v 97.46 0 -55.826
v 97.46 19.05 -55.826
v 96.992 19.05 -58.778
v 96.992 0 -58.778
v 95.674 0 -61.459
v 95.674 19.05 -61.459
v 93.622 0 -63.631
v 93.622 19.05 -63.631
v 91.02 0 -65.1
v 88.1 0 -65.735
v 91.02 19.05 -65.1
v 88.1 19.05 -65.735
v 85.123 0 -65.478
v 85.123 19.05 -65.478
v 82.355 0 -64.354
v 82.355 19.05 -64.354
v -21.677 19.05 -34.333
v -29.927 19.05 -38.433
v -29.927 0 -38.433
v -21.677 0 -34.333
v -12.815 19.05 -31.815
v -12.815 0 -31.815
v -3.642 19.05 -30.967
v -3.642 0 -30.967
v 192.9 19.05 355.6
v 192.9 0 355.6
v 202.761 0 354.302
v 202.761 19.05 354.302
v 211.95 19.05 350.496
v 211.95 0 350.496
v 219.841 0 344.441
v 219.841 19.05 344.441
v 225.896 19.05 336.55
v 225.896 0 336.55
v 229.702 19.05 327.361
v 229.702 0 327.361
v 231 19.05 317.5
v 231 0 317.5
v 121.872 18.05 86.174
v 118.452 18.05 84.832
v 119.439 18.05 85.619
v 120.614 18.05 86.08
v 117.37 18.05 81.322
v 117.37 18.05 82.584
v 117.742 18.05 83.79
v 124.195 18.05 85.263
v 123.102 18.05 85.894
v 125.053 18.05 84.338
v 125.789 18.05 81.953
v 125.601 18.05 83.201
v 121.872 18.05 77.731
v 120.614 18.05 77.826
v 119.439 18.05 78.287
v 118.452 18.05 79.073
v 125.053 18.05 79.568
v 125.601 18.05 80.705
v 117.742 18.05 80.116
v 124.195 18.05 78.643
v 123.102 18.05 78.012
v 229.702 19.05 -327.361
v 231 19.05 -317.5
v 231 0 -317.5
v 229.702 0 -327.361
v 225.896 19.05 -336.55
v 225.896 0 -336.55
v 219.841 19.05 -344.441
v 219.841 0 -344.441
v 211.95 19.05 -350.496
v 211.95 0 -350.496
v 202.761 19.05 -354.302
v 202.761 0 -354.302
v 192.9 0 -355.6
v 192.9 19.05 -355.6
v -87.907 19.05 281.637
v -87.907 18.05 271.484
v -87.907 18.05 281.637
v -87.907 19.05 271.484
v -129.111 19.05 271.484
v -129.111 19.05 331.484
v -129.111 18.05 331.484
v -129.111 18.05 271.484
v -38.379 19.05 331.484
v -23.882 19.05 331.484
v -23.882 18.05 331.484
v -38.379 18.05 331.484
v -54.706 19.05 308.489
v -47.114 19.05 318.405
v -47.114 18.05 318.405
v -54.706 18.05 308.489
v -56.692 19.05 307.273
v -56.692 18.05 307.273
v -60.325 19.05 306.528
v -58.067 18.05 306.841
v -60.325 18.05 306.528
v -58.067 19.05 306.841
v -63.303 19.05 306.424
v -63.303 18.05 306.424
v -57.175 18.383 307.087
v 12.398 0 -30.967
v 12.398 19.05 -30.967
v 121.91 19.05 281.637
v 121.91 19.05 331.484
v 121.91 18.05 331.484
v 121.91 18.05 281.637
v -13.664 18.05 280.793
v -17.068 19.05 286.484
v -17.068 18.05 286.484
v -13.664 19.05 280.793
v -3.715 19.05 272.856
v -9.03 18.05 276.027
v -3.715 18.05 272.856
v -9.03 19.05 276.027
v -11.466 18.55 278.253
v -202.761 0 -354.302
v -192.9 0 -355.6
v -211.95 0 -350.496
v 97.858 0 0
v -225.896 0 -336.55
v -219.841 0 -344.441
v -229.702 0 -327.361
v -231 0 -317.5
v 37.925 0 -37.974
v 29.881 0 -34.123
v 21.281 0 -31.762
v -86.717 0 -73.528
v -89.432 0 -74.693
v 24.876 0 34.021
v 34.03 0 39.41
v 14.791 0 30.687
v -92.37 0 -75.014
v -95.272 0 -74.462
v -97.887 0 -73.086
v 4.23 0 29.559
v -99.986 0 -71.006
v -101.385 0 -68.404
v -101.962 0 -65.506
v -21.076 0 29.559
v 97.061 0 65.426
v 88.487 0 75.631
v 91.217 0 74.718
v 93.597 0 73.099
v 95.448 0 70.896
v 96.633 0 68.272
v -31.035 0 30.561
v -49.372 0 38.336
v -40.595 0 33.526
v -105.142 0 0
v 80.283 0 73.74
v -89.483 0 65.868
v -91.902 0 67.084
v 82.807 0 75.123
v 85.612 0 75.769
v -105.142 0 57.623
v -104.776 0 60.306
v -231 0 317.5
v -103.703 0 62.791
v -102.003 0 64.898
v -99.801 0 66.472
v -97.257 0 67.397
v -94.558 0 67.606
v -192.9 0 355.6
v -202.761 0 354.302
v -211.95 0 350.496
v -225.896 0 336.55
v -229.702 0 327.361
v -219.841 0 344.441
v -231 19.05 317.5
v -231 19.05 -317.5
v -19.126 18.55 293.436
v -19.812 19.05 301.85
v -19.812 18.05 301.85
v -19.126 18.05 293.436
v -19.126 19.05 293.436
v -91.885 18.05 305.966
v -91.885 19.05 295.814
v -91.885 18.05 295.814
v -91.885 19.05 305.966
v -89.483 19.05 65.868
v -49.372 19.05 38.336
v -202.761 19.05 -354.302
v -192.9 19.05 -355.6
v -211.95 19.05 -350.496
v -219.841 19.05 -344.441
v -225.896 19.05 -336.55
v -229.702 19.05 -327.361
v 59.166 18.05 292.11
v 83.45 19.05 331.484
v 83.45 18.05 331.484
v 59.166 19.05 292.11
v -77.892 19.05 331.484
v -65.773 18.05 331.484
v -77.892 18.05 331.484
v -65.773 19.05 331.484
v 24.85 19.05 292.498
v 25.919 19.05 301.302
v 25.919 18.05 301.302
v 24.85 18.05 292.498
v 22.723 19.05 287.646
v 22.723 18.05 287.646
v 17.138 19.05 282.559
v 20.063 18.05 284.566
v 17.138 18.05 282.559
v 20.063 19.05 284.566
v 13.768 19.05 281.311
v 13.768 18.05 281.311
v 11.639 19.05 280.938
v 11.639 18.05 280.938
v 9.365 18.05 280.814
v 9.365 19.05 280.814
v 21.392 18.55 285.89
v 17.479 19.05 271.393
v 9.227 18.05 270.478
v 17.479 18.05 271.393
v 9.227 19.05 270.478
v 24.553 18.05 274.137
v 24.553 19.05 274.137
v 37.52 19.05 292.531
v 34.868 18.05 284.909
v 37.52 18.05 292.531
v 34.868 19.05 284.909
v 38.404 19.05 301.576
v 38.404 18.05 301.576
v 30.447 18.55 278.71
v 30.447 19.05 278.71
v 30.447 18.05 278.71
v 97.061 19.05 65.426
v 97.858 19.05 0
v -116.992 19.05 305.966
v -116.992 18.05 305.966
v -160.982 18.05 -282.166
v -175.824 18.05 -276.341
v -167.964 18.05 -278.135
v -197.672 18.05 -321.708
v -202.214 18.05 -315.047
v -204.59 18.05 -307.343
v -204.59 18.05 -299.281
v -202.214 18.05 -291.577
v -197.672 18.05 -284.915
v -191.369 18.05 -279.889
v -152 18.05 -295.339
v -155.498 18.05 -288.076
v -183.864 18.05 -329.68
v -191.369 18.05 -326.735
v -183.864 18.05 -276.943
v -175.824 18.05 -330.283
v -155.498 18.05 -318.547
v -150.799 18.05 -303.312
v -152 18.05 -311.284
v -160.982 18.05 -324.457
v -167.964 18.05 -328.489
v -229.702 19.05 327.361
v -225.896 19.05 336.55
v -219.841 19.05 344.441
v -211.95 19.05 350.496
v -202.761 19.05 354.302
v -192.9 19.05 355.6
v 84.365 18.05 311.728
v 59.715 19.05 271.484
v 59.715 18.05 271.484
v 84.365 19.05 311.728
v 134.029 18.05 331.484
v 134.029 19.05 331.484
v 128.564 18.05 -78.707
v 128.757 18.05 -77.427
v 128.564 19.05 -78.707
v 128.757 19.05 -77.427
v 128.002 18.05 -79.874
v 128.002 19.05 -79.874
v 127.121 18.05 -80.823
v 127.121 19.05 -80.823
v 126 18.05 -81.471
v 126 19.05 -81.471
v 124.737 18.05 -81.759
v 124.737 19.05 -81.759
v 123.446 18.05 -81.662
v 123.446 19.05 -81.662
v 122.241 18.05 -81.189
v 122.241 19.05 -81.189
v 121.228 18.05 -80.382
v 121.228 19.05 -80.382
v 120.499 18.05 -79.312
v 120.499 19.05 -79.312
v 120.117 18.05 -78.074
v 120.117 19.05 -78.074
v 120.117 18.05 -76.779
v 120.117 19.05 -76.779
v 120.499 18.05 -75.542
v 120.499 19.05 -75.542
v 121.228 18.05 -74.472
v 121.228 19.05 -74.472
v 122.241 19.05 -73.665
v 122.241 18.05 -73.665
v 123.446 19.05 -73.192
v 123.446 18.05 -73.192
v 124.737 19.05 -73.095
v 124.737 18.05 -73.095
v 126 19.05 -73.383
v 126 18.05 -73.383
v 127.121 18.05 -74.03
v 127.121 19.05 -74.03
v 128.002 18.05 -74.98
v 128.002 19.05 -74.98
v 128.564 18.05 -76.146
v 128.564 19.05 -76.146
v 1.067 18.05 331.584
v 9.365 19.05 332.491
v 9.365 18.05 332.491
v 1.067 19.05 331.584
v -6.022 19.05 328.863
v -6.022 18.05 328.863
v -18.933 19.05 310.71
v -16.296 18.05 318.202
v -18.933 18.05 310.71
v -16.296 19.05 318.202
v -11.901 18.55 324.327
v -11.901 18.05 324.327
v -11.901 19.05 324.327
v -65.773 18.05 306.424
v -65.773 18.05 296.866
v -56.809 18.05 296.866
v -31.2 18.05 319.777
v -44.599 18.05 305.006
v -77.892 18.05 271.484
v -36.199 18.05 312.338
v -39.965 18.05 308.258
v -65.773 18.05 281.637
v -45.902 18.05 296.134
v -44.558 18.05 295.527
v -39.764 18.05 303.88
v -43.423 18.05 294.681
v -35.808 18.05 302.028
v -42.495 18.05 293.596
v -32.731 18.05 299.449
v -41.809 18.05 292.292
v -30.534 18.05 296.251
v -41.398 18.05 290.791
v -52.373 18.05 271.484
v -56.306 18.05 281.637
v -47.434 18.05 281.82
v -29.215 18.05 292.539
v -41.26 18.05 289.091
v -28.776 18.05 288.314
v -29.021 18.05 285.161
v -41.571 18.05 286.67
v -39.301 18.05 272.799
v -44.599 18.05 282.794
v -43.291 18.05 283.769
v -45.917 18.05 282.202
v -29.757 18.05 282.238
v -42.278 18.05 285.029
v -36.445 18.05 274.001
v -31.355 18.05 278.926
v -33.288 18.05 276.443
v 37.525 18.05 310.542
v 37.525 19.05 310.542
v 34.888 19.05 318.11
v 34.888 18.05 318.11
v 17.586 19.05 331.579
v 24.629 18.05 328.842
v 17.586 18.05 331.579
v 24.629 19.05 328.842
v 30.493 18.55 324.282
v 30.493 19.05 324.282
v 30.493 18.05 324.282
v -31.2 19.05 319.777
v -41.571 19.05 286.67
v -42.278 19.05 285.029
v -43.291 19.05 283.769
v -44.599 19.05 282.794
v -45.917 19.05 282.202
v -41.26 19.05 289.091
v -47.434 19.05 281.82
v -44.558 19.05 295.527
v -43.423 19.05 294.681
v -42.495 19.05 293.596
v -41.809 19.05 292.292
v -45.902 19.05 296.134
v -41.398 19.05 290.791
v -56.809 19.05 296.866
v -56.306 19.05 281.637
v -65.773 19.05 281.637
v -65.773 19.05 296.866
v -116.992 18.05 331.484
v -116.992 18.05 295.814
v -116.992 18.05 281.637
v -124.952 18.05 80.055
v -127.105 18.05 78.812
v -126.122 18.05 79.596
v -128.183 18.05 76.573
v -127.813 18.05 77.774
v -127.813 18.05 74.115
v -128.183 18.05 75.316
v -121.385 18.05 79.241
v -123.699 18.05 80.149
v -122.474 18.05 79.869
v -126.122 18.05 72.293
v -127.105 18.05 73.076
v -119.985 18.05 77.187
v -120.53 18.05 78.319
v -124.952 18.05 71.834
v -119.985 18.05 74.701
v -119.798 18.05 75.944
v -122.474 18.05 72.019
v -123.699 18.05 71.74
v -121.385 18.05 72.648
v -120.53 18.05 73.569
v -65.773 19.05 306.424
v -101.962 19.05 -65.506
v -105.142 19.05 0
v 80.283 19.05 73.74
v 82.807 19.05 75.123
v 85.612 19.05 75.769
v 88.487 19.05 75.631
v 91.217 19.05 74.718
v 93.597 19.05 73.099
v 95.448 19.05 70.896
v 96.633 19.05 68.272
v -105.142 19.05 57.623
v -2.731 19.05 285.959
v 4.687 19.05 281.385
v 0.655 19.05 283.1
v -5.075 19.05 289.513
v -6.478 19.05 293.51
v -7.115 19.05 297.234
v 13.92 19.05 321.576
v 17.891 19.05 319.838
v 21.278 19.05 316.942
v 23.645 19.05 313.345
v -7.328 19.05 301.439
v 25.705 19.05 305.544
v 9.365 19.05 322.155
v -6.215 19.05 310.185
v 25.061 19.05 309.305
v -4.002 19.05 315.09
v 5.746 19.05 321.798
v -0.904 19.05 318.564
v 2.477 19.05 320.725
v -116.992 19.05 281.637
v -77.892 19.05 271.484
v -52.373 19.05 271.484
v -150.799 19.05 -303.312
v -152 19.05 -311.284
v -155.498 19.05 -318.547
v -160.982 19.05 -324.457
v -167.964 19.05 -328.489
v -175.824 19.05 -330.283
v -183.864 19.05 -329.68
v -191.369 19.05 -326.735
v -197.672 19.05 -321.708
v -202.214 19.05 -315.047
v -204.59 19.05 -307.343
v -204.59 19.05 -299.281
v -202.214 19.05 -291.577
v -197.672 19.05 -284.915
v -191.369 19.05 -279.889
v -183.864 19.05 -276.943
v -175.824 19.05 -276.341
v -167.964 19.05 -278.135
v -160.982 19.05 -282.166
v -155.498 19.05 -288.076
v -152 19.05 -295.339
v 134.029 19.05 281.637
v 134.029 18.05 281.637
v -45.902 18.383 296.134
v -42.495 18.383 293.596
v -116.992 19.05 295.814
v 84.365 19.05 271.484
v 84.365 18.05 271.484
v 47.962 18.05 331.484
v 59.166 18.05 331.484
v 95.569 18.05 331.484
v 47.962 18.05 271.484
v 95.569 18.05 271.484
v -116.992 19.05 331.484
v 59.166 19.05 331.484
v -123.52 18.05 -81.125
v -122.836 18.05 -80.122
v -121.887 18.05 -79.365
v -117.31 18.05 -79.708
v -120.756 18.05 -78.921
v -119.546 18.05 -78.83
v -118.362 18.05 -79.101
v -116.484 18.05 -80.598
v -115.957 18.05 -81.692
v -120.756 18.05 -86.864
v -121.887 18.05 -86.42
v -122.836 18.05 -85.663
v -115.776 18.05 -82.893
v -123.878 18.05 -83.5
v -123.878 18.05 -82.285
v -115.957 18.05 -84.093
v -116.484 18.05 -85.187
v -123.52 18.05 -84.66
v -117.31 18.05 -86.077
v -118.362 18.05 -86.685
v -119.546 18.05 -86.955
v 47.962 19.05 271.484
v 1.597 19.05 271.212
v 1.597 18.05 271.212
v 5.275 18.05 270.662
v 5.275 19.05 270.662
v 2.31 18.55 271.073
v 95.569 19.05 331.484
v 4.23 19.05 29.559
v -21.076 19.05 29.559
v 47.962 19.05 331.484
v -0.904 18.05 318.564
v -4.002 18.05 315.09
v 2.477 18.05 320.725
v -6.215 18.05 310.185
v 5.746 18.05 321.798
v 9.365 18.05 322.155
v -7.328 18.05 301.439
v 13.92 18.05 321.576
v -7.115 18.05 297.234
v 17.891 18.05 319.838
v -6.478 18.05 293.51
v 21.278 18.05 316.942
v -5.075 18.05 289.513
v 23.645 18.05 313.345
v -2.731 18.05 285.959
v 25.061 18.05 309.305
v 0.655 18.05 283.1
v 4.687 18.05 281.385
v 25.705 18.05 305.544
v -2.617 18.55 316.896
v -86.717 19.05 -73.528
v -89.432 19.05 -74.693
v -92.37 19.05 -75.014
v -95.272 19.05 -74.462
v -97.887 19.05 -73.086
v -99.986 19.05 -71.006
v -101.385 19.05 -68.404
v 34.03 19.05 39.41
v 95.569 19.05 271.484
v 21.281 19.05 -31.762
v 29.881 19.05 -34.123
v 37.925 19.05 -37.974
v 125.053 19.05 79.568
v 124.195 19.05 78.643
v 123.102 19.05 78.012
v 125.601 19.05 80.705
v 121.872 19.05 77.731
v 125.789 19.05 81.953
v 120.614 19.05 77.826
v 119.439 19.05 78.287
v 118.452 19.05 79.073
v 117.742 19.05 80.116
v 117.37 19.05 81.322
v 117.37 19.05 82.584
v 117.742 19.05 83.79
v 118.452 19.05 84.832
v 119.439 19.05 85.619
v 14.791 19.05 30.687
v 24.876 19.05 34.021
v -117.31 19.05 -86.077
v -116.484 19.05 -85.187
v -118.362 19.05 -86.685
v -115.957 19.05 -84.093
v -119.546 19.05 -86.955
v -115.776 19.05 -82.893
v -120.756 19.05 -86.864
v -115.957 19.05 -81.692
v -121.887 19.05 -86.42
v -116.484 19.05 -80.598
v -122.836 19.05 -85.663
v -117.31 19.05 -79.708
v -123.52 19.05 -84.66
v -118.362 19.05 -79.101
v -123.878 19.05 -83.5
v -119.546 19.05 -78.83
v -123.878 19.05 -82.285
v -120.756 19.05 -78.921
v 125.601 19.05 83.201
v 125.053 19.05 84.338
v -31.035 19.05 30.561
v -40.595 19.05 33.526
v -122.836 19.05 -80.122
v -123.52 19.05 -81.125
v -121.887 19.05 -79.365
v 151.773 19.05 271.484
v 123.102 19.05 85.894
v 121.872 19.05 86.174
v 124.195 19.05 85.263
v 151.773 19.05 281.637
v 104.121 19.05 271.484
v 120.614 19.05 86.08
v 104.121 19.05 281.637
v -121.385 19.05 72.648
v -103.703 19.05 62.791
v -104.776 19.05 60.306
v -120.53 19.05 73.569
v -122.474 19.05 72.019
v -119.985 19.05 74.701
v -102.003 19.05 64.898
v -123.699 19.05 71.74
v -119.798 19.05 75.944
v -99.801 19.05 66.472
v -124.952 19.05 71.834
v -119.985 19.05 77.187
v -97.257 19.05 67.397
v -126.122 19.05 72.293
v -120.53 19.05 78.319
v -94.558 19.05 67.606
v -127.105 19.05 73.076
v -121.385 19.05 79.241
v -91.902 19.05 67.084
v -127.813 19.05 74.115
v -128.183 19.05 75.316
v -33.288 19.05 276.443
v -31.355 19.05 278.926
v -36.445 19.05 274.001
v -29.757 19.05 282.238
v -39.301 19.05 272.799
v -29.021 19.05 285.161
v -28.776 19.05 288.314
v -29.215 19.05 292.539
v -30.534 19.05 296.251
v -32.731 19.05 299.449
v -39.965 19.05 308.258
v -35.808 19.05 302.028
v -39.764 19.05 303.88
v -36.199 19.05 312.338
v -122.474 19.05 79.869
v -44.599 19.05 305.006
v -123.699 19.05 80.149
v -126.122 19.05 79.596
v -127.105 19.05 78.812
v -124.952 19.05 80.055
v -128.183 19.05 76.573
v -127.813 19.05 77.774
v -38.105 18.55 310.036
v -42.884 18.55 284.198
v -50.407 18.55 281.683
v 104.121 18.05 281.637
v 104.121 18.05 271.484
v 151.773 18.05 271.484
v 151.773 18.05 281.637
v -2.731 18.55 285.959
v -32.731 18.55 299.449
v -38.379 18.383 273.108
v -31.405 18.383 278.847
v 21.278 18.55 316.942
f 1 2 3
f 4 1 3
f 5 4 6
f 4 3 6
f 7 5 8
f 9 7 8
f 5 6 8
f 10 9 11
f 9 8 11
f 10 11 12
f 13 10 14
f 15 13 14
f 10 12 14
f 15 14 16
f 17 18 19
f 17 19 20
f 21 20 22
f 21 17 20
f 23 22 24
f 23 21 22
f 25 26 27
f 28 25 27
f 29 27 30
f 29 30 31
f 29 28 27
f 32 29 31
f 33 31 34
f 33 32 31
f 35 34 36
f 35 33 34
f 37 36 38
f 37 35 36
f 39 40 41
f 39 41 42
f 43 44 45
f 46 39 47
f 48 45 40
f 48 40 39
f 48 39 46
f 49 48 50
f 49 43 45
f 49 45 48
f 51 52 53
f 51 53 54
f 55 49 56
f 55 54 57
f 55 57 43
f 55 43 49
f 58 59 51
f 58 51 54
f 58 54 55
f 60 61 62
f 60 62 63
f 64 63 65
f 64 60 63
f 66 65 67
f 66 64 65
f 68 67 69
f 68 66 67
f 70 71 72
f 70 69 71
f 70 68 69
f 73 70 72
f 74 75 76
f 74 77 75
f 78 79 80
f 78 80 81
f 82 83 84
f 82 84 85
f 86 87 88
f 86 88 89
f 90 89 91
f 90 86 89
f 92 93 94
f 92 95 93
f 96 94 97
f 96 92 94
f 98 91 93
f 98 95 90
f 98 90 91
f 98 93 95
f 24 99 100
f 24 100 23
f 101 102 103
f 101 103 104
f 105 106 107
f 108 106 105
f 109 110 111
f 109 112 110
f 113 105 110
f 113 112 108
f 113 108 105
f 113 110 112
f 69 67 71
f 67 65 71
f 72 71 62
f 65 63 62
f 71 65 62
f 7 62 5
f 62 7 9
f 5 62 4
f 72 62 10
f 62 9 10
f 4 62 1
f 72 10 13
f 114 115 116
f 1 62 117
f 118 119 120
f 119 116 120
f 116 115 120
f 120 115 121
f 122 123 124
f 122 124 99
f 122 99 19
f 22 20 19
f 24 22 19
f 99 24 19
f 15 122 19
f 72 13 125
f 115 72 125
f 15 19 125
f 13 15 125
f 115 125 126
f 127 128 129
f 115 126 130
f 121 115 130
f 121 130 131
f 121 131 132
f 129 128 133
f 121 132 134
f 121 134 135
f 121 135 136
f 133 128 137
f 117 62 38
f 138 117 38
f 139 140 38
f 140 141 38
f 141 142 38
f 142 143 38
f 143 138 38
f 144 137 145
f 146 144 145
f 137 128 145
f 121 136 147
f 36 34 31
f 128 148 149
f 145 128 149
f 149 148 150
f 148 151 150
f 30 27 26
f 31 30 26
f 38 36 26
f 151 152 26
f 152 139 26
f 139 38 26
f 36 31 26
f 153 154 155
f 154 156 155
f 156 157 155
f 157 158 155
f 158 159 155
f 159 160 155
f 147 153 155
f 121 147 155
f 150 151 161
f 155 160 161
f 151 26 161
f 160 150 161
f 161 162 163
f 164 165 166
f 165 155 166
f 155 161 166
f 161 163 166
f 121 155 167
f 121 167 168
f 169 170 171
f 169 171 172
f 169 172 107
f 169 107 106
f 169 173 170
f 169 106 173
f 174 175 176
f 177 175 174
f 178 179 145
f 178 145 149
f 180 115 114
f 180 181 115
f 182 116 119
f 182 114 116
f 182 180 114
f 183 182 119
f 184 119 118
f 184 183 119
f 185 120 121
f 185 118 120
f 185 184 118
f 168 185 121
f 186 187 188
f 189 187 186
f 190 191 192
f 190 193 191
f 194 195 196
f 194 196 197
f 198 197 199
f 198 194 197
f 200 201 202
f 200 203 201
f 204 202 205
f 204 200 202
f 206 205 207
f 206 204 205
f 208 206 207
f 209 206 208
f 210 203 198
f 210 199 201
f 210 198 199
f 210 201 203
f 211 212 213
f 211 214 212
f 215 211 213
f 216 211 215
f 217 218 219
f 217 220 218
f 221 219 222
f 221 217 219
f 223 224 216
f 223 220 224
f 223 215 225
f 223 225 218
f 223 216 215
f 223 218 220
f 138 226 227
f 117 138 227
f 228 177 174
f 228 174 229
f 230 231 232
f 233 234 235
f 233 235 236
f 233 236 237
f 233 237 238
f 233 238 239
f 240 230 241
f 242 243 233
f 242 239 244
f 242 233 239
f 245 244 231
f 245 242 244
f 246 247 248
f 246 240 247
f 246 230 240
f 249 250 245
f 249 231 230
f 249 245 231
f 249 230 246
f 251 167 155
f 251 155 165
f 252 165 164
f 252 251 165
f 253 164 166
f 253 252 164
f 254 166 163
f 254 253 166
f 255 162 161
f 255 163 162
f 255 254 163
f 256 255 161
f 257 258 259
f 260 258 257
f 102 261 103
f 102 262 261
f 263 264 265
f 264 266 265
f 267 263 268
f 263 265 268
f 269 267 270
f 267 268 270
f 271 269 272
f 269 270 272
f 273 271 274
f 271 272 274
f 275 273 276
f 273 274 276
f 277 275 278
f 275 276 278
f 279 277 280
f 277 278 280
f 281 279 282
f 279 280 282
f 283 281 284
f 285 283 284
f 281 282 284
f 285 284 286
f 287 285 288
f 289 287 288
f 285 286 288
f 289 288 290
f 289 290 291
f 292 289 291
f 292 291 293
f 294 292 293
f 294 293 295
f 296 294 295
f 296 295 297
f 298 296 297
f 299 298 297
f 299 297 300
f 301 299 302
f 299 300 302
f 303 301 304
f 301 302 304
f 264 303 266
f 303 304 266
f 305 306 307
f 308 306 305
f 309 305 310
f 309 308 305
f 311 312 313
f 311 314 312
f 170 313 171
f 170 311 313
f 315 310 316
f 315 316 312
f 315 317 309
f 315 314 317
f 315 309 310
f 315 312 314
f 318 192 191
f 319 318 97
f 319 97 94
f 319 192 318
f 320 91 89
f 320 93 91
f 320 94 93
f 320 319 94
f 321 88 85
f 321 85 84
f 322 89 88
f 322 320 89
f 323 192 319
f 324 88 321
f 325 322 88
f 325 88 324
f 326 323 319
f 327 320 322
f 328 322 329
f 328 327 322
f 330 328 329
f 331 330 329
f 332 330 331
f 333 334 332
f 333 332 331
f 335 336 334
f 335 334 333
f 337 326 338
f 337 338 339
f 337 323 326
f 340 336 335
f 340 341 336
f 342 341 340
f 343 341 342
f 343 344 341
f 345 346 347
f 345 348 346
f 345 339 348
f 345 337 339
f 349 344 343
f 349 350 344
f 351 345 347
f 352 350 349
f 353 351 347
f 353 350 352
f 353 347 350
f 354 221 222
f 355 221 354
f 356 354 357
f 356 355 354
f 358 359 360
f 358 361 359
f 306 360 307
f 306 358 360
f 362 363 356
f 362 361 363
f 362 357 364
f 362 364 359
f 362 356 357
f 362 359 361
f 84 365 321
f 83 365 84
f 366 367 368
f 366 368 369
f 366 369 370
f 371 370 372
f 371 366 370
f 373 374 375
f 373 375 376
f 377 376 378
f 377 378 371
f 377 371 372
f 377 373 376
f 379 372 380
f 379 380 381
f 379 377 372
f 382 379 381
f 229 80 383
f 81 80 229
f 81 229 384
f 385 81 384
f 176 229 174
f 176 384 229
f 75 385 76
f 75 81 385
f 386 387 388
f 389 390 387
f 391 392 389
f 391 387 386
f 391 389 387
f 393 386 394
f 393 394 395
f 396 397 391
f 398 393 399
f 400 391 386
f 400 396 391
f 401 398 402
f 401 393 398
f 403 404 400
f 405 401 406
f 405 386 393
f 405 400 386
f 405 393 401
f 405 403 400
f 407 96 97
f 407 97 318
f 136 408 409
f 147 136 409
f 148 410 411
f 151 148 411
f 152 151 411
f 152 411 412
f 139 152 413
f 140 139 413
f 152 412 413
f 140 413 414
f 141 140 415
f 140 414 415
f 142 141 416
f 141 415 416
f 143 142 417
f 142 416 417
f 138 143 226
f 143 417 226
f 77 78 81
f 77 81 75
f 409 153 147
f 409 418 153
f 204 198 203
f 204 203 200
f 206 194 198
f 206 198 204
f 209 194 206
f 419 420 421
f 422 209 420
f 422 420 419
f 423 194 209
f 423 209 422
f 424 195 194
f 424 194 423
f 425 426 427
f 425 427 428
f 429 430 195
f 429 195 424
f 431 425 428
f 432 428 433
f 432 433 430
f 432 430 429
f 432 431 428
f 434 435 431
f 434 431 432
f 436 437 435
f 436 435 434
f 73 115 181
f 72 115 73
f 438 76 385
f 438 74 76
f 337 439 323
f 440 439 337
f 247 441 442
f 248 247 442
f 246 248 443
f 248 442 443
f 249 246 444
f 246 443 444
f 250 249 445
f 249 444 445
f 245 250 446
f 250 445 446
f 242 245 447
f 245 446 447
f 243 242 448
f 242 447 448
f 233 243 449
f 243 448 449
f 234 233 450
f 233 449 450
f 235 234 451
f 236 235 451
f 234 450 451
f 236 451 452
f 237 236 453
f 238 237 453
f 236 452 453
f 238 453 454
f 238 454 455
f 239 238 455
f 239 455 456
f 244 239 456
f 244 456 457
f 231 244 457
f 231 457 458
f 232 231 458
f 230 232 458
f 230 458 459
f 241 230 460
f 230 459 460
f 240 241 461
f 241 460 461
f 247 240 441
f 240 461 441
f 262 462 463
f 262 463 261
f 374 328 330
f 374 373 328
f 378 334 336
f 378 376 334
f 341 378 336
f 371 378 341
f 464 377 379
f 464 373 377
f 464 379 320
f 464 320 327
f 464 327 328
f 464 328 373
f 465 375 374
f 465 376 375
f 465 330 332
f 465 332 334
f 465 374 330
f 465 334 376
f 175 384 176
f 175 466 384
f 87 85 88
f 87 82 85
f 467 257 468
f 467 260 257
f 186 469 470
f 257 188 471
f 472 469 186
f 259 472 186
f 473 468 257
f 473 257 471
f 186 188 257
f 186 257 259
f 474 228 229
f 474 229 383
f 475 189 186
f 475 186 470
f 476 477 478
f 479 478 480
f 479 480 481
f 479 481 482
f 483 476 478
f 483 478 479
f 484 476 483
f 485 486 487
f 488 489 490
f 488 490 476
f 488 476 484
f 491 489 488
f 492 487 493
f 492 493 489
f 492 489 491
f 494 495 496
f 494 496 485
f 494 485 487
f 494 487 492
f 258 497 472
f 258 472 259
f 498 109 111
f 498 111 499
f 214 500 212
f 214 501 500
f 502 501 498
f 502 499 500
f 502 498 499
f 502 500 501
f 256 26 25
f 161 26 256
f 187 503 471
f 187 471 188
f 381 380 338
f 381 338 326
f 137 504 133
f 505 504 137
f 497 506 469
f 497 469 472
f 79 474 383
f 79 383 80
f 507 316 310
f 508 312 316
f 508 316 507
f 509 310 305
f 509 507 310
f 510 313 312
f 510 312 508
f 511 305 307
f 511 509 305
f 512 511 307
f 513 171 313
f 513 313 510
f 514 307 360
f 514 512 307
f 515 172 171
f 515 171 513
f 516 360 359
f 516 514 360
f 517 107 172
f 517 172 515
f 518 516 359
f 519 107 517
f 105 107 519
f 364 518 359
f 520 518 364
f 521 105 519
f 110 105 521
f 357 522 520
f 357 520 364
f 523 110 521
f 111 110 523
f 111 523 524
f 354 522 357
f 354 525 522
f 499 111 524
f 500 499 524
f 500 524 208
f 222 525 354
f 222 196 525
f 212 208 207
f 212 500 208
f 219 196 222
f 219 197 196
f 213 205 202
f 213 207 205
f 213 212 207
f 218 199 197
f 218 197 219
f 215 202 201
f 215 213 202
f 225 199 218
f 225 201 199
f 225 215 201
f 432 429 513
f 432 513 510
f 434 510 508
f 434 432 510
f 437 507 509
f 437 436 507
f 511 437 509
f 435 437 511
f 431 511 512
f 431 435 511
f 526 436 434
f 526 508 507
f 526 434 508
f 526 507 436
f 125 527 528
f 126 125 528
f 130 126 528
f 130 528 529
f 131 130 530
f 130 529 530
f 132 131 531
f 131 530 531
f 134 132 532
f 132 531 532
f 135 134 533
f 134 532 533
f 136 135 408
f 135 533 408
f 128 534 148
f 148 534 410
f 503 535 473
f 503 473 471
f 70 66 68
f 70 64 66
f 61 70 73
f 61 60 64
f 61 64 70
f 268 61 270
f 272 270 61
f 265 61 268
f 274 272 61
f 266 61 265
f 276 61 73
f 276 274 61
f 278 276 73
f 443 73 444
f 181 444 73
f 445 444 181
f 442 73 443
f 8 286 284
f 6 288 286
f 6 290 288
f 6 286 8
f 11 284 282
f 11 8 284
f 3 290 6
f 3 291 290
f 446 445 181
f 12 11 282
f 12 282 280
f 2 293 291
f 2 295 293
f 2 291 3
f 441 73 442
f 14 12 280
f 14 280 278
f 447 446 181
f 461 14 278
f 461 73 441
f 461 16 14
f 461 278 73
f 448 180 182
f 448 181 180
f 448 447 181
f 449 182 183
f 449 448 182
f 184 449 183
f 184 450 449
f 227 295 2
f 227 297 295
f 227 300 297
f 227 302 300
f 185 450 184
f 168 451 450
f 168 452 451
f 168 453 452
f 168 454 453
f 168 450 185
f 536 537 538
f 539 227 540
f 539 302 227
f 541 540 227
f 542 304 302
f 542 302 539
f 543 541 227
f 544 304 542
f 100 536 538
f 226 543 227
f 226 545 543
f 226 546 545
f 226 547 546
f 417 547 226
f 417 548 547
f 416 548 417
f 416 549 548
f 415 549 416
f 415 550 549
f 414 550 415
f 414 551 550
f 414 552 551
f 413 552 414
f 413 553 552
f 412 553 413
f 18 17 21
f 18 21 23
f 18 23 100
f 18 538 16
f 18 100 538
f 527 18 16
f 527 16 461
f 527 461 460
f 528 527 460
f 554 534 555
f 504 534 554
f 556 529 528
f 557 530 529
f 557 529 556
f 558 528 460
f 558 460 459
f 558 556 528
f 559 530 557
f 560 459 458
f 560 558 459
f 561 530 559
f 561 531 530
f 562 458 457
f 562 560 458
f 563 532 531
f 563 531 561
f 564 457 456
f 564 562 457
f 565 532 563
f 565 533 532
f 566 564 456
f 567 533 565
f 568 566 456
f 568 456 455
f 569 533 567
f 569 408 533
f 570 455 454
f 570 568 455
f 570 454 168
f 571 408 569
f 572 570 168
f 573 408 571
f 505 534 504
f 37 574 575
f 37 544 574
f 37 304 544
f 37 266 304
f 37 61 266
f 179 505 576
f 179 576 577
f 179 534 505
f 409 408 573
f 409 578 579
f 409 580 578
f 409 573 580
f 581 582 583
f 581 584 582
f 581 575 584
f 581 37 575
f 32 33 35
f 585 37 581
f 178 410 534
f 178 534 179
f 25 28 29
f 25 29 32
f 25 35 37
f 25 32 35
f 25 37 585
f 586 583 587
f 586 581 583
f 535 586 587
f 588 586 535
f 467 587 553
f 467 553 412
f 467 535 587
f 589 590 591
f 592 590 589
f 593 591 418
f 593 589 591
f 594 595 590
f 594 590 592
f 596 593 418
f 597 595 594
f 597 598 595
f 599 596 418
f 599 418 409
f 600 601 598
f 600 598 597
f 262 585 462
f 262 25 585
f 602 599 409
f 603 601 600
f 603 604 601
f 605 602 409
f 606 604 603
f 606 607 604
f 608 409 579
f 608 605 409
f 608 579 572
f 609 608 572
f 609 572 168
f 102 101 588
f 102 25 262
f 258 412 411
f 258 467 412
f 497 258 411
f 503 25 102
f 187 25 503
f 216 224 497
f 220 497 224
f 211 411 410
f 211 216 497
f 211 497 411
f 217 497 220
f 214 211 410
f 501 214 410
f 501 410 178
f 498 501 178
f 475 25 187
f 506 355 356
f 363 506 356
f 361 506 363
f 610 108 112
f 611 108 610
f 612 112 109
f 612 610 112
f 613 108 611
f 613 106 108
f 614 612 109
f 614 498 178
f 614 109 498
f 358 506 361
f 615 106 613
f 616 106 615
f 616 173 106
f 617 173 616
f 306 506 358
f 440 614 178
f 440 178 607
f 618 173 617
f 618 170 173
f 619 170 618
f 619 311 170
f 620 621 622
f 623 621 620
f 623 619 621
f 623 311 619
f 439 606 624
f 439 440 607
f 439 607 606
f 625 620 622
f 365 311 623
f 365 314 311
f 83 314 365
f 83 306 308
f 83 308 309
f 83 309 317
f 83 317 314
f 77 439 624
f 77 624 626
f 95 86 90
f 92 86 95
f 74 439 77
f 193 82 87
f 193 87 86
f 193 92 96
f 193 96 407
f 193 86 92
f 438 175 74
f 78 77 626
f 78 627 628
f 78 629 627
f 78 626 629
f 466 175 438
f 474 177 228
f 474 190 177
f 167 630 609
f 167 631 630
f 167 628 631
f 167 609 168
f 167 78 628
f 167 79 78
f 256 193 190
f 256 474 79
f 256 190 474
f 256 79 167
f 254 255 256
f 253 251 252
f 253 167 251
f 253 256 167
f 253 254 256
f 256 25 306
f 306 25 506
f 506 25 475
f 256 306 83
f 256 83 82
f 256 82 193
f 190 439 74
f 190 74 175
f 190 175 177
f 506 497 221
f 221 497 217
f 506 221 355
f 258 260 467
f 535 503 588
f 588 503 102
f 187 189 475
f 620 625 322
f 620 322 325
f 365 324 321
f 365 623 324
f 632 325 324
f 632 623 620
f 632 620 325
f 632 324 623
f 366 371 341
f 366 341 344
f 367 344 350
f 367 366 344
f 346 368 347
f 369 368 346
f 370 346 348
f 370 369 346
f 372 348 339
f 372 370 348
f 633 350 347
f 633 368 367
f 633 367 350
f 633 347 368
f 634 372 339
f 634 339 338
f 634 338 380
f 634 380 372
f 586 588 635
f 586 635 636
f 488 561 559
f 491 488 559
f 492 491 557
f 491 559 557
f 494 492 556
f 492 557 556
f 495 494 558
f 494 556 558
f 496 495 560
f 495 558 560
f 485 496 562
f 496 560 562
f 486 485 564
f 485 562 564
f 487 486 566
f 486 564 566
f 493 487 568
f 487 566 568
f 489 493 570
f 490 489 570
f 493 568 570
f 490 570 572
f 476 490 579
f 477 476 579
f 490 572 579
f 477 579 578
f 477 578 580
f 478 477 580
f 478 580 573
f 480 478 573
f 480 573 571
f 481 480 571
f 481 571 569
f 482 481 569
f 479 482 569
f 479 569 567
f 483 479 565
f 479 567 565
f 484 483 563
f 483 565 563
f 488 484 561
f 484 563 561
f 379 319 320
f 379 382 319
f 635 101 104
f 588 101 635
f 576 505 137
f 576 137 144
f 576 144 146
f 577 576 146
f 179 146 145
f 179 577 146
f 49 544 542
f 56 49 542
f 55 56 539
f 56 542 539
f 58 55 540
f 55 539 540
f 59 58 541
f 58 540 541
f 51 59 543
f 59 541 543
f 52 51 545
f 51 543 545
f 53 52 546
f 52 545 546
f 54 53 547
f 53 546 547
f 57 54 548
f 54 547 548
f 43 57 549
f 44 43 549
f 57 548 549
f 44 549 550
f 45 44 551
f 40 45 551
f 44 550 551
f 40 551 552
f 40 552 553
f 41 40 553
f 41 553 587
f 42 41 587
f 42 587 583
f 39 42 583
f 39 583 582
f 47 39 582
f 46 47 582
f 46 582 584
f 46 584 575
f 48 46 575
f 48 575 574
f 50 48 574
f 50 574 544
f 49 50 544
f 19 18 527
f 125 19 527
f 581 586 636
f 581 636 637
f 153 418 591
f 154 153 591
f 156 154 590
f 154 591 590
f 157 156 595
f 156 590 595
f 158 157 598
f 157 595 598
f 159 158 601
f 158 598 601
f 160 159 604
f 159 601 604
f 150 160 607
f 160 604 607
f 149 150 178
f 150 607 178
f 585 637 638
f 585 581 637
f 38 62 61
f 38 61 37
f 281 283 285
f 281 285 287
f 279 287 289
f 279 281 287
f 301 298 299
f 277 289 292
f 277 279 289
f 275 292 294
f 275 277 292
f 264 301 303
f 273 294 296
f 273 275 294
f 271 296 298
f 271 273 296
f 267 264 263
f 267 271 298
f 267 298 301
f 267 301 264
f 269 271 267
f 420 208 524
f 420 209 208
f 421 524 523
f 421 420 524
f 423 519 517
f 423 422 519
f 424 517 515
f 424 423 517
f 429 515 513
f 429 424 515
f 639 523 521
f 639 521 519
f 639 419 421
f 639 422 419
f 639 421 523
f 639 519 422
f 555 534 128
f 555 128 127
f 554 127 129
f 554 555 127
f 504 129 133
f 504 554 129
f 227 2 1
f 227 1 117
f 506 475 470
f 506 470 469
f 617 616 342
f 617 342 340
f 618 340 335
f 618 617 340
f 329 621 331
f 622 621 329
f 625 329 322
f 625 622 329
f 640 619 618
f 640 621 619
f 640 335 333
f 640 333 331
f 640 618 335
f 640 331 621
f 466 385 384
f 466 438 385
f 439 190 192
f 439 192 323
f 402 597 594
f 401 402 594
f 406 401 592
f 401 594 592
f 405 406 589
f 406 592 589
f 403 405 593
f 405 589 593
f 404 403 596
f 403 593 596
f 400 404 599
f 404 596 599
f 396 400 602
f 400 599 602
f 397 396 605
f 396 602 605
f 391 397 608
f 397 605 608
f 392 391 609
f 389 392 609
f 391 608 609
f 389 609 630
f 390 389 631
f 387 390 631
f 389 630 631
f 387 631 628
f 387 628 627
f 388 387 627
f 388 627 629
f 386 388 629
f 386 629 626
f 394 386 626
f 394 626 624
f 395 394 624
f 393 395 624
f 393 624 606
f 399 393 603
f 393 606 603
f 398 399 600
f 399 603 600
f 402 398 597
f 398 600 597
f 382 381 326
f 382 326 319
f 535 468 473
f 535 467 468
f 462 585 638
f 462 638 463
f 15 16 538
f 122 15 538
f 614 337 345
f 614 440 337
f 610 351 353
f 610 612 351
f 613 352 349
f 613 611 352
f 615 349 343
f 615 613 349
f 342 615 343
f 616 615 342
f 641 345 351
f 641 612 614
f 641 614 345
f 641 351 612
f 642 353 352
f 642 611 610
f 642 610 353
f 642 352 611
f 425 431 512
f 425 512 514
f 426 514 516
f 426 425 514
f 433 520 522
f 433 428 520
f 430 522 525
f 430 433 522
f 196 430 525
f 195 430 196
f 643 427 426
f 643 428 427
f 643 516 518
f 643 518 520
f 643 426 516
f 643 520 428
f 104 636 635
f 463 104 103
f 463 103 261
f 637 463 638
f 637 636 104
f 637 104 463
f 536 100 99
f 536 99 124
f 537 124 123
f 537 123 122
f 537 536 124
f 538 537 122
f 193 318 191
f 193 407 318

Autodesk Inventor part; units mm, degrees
ref_plane "YZ Plane" through (0, 0, 0) normal (1, 0, 0) x (0, 1, 0)
ref_plane "XZ Plane" through (0, 0, 0) normal (0, 1, 0) x (-1, 0, 0)
ref_plane "XY Plane" through (0, 0, 0) normal (0, 0, 1) x (1, 0, 0)
sketch "Sketch1" plane through (0, 0, 0) normal (0, 1, 0) x (-1, 0, 0)
  line L0 (-231, 355.6) -> (231, 355.6)
  line L1 (231, 355.6) -> (231, -355.6)
  line L2 (231, -355.6) -> (-231, -355.6)
  line L3 (-231, -355.6) -> (-231, 355.6)
  line L4 (-231, 355.6) -> (231, -355.6) construction
  line L5 (231, 355.6) -> (-231, -355.6) construction
  point P0 (0, 0)
  dimension "d0" = 462
  dimension "d1" = 711.2
extrude "Extrusion1" add sketch "Sketch1" along normal blind 19.05
fillet "Fillet1" radius 38.1 4 edges at (231, 9.525, 355.6) (-231, 9.525, 355.6) (-231, 9.525, -355.6) (231, 9.525, -355.6)
sketch "Sketch2" plane through (0, 19.05, 0) normal (0, 1, 0) x (1, 0, 0)
  line L0 (152.8766, -178.8891) -> (-179.8029, -178.8891) construction
  line L1 (-179.8029, -178.8891) -> (-179.8029, 264.6836) construction
  line L2 (-179.8029, 264.6836) -> (152.8766, 264.6836) construction
  line L3 (152.8766, 264.6836) -> (152.8766, -178.8891) construction
  line L4 (0, -29.5589) -> (0, 30.9666) construction
  line L5 (0, 30.9666) -> (0, 0.7039) construction
  line L6 (97.858, 0) -> (-105.142, 0) construction
  point P0 (0, 0)
  dimension "d23" = 203
  dimension "d28" = 60.5255
  dimension "d29" = 178.8891
  dimension "d31" = 55.0186
  dimension "d32" = 152.8766
  dimension "d34" = 149.3302
  dimension "d41" = 332.6795
sketch "Sketch3" plane through (0, 19.05, 0) normal (0, 1, 0) x (1, 0, 0)
  circle A0 centre (-177.8454, 303.3116) radius 27.0466
  point P0 (0, 0)
extrude "Extrusion2" cut sketch "Sketch3" against normal blind 1
sketch "Sketch4" plane through (0, 19.05, 0) normal (0, 1, 0) x (1, 0, 0)
  point P0 (0, 0)
sketch "Sketch5" plane through (0, 19.05, 0) normal (0, 1, 0) x (1, 0, 0)
  line L0 (-102.322, -272.8587) -> (120.5938, -272.8587) construction
  line L1 (120.5938, -272.8587) -> (120.5938, -330.1103) construction
  line L2 (120.5938, -330.1103) -> (-102.322, -330.1103) construction
  line L3 (-102.322, -330.1103) -> (-102.322, -272.8587) construction
  line L4 (-129.111, -331.4845) -> (-129.111, -271.4845)
  line L5 (-129.111, -271.4845) -> (-87.9068, -271.4845)
  line L6 (-87.9068, -271.4845) -> (-87.9068, -281.6369)
  line L7 (-87.9068, -281.6369) -> (-116.9921, -281.6369)
  line L8 (-116.9921, -281.6369) -> (-116.9921, -295.8137)
  line L9 (-116.9921, -295.8137) -> (-91.8854, -295.8137)
  line L10 (-91.8854, -295.8137) -> (-91.8854, -305.9662)
  line L11 (-91.8854, -305.9662) -> (-116.9921, -305.9662)
  line L12 (-116.9921, -305.9662) -> (-116.9921, -331.4845)
  line L13 (-116.9921, -331.4845) -> (-129.111, -331.4845)
  line L14 (-77.8915, -331.4845) -> (-77.8915, -271.4845)
  line L15 (-77.8915, -271.4845) -> (-52.3732, -271.4845)
  spline S0 degree 2 poles (-52.3732, -271.4845) (-42.7239, -271.4845) (-34.0348, -274.7314) (-28.7757, -282.9631) (-28.7757, -288.3137) knots 0 0 0 1 2 3 3 3
  spline S1 degree 2 poles (-28.7757, -288.3137) (-28.7757, -295.0363) (-36.6873, -303.8625) (-44.5989, -305.0058) knots 0 0 0 1 2 2 2
  spline S2 degree 2 poles (-44.5989, -305.0058) (-40.6659, -307.2924) (-35.544, -312.7802) (-31.1995, -319.7771) knots 0 0 0 1 2 2 2
  line L16 (-31.1995, -319.7771) -> (-23.8824, -331.4845)
  line L17 (-23.8824, -331.4845) -> (-38.3793, -331.4845)
  line L18 (-38.3793, -331.4845) -> (-47.1141, -318.4052)
  spline S3 degree 2 poles (-47.1141, -318.4052) (-51.8245, -311.4082) (-55.2543, -307.7497) (-59.0958, -306.4235) (-63.3031, -306.4235) knots 0 0 0 1 2 3 3 3
  line L19 (-63.3031, -306.4235) -> (-65.7726, -306.4235)
  line L20 (-65.7726, -306.4235) -> (-65.7726, -331.4845)
  line L21 (-65.7726, -331.4845) -> (-77.8915, -331.4845)
  line L22 (-65.7726, -296.8656) -> (-56.8092, -296.8656)
  spline S4 degree 2 poles (-56.8092, -296.8656) (-48.0745, -296.8656) (-43.73, -295.4021) (-41.2604, -291.7893) (-41.2604, -289.0912) knots 0 0 0 1 2 3 3 3
  spline S5 degree 2 poles (-41.2604, -289.0912) (-41.2604, -286.0729) (-44.5074, -282.3229) (-47.4342, -281.8198) knots 0 0 0 1 2 2 2
  spline S6 degree 2 poles (-47.4342, -281.8198) (-48.9434, -281.6369) (-56.3062, -281.6369) knots 0 0 0 1 1 1
  line L23 (-56.3062, -281.6369) -> (-65.7726, -281.6369)
  line L24 (-65.7726, -281.6369) -> (-65.7726, -296.8656)
  spline S7 degree 2 poles (-19.8123, -301.8503) (-19.8123, -292.704) (-17.0684, -286.4845) knots 0 0 0 1 1 1
  spline S8 degree 2 poles (-17.0684, -286.4845) (-15.0104, -281.9113) (-7.922, -274.5942) (-3.7147, -272.8564) knots 0 0 0 1 2 2 2
  spline S9 degree 2 poles (-3.7147, -272.8564) (1.8646, -270.4784) (9.2274, -270.4784) knots 0 0 0 1 1 1
  spline S10 degree 2 poles (9.2274, -270.4784) (22.4896, -270.4784) (38.4042, -286.9418) (38.4042, -301.5759) knots 0 0 0 1 2 2 2
  spline S11 degree 2 poles (38.4042, -301.5759) (38.4042, -316.0729) (22.581, -332.4906) (9.3646, -332.4906) knots 0 0 0 1 2 2 2
  spline S12 degree 2 poles (9.3646, -332.4906) (-3.9891, -332.4906) (-19.8123, -316.1643) (-19.8123, -301.8503) knots 0 0 0 1 2 2 2
  spline S13 degree 2 poles (-7.3275, -301.4387) (-7.3275, -311.6369) (2.0932, -322.1552) (9.3646, -322.1552) knots 0 0 0 1 2 2 2
  spline S14 degree 2 poles (9.3646, -322.1552) (16.6359, -322.1552) (25.9194, -311.7284) (25.9194, -301.3015) knots 0 0 0 1 2 2 2
  spline S15 degree 2 poles (25.9194, -301.3015) (25.9194, -290.9662) (16.8646, -280.8137) (9.3646, -280.8137) knots 0 0 0 1 2 2 2
  spline S16 degree 2 poles (9.3646, -280.8137) (1.8646, -280.8137) (-7.3275, -291.1034) (-7.3275, -301.4387) knots 0 0 0 1 2 2 2
  line L25 (47.9621, -331.4845) -> (47.9621, -271.4845)
  line L26 (47.9621, -271.4845) -> (59.7152, -271.4845)
  line L27 (59.7152, -271.4845) -> (84.3646, -311.7284)
  line L28 (84.3646, -311.7284) -> (84.3646, -271.4845)
  line L29 (84.3646, -271.4845) -> (95.5688, -271.4845)
  line L30 (95.5688, -271.4845) -> (95.5688, -331.4845)
  line L31 (95.5688, -331.4845) -> (83.4499, -331.4845)
  line L32 (83.4499, -331.4845) -> (59.1664, -292.1095)
  line L33 (59.1664, -292.1095) -> (59.1664, -331.4845)
  line L34 (59.1664, -331.4845) -> (47.9621, -331.4845)
  line L35 (121.9103, -331.4845) -> (121.9103, -281.6369)
  line L36 (121.9103, -281.6369) -> (104.1207, -281.6369)
  line L37 (104.1207, -281.6369) -> (104.1207, -271.4845)
  line L38 (104.1207, -271.4845) -> (151.7731, -271.4845)
  line L39 (151.7731, -271.4845) -> (151.7731, -281.6369)
  line L40 (151.7731, -281.6369) -> (134.0292, -281.6369)
  line L41 (134.0292, -281.6369) -> (134.0292, -331.4845)
  line L42 (134.0292, -331.4845) -> (121.9103, -331.4845)
  point P0 (0, 0)
extrude "Extrusion3" cut sketch "Sketch5" against normal blind 1
sketch "Sketch6" plane through (0, 19.05, 0) normal (0, 1, 0) x (1, 0, 0)
  line L0 (4.2298, -29.5589) -> (-21.0762, -29.5589)
  line L1 (12.3982, 30.9666) -> (-3.642, 30.9666)
  line L2 (82.3546, 64.3536) -> (37.925, 37.9738)
  line L3 (-29.9268, 38.433) -> (-86.7171, 73.5282)
  line L4 (-49.372, -38.3358) -> (-89.4828, -65.8681)
  line L5 (34.0297, -39.4096) -> (80.2832, -73.7401)
  line L6 (0, -29.5589) -> (0, 30.9666) construction
  line L7 (97.858, 0) -> (-105.142, 0) construction
  arc A0 (-21.0762, -29.5589) -> (-49.372, -38.3358) centre (-21.0762, -79.5589) ccw
  arc A1 (34.0297, -39.4096) -> (4.2298, -29.5589) centre (4.2298, -79.5589) ccw
  arc A2 (12.3982, 30.9666) -> (37.925, 37.9738) centre (12.3982, 80.9666) ccw
  arc A3 (-29.9268, 38.433) -> (-3.642, 30.9666) centre (-3.642, 80.9666) ccw
  arc A4 (97.4597, 55.8264) -> (82.3546, 64.3536) centre (87.4599, 55.7551) ccw
  arc A5 (80.2832, -73.7401) -> (97.0614, -65.4261) centre (86.549, -65.2981) ccw
  arc A6 (-105.142, -57.6234) -> (-89.4828, -65.8681) centre (-95.142, -57.6234) ccw
  arc A7 (-86.7171, 73.5282) -> (-101.9624, 65.5063) centre (-91.9741, 65.0214) ccw
  line L8 (-101.9624, 65.5063) -> (-105.142, 0)
  line L9 (-105.142, -57.6234) -> (-105.142, 0)
  line L10 (97.0614, -65.4261) -> (97.858, 0)
  line L11 (97.4597, 55.8264) -> (97.858, 0)
  point P0 (0, 0)
  dimension "d56" = 50
  dimension "d57" = 50
  dimension "d58" = 50
  dimension "d59" = 10
  dimension "d61" = 10
  dimension "d62" = 10
extrude "Extrusion4" cut sketch "Sketch6" against normal through all
sketch "Sketch7" plane through (0, 19.05, 0) normal (0, 1, 0) x (1, 0, 0)
  circle A0 centre (121.5557, -81.9528) radius 4.2334
  circle A1 centre (124.4127, 77.4269) radius 4.3443
  circle A2 centre (-119.85, 82.8926) radius 4.0735
  circle A3 centre (-124.0139, -75.9442) radius 4.2163
  point P0 (0, 0)
extrude "Extrusion5" cut sketch "Sketch7" against normal blind 1
equation "\"d57\" = d56"
equation "\"d58\" = d57"
properties part number "BaseBoard"
